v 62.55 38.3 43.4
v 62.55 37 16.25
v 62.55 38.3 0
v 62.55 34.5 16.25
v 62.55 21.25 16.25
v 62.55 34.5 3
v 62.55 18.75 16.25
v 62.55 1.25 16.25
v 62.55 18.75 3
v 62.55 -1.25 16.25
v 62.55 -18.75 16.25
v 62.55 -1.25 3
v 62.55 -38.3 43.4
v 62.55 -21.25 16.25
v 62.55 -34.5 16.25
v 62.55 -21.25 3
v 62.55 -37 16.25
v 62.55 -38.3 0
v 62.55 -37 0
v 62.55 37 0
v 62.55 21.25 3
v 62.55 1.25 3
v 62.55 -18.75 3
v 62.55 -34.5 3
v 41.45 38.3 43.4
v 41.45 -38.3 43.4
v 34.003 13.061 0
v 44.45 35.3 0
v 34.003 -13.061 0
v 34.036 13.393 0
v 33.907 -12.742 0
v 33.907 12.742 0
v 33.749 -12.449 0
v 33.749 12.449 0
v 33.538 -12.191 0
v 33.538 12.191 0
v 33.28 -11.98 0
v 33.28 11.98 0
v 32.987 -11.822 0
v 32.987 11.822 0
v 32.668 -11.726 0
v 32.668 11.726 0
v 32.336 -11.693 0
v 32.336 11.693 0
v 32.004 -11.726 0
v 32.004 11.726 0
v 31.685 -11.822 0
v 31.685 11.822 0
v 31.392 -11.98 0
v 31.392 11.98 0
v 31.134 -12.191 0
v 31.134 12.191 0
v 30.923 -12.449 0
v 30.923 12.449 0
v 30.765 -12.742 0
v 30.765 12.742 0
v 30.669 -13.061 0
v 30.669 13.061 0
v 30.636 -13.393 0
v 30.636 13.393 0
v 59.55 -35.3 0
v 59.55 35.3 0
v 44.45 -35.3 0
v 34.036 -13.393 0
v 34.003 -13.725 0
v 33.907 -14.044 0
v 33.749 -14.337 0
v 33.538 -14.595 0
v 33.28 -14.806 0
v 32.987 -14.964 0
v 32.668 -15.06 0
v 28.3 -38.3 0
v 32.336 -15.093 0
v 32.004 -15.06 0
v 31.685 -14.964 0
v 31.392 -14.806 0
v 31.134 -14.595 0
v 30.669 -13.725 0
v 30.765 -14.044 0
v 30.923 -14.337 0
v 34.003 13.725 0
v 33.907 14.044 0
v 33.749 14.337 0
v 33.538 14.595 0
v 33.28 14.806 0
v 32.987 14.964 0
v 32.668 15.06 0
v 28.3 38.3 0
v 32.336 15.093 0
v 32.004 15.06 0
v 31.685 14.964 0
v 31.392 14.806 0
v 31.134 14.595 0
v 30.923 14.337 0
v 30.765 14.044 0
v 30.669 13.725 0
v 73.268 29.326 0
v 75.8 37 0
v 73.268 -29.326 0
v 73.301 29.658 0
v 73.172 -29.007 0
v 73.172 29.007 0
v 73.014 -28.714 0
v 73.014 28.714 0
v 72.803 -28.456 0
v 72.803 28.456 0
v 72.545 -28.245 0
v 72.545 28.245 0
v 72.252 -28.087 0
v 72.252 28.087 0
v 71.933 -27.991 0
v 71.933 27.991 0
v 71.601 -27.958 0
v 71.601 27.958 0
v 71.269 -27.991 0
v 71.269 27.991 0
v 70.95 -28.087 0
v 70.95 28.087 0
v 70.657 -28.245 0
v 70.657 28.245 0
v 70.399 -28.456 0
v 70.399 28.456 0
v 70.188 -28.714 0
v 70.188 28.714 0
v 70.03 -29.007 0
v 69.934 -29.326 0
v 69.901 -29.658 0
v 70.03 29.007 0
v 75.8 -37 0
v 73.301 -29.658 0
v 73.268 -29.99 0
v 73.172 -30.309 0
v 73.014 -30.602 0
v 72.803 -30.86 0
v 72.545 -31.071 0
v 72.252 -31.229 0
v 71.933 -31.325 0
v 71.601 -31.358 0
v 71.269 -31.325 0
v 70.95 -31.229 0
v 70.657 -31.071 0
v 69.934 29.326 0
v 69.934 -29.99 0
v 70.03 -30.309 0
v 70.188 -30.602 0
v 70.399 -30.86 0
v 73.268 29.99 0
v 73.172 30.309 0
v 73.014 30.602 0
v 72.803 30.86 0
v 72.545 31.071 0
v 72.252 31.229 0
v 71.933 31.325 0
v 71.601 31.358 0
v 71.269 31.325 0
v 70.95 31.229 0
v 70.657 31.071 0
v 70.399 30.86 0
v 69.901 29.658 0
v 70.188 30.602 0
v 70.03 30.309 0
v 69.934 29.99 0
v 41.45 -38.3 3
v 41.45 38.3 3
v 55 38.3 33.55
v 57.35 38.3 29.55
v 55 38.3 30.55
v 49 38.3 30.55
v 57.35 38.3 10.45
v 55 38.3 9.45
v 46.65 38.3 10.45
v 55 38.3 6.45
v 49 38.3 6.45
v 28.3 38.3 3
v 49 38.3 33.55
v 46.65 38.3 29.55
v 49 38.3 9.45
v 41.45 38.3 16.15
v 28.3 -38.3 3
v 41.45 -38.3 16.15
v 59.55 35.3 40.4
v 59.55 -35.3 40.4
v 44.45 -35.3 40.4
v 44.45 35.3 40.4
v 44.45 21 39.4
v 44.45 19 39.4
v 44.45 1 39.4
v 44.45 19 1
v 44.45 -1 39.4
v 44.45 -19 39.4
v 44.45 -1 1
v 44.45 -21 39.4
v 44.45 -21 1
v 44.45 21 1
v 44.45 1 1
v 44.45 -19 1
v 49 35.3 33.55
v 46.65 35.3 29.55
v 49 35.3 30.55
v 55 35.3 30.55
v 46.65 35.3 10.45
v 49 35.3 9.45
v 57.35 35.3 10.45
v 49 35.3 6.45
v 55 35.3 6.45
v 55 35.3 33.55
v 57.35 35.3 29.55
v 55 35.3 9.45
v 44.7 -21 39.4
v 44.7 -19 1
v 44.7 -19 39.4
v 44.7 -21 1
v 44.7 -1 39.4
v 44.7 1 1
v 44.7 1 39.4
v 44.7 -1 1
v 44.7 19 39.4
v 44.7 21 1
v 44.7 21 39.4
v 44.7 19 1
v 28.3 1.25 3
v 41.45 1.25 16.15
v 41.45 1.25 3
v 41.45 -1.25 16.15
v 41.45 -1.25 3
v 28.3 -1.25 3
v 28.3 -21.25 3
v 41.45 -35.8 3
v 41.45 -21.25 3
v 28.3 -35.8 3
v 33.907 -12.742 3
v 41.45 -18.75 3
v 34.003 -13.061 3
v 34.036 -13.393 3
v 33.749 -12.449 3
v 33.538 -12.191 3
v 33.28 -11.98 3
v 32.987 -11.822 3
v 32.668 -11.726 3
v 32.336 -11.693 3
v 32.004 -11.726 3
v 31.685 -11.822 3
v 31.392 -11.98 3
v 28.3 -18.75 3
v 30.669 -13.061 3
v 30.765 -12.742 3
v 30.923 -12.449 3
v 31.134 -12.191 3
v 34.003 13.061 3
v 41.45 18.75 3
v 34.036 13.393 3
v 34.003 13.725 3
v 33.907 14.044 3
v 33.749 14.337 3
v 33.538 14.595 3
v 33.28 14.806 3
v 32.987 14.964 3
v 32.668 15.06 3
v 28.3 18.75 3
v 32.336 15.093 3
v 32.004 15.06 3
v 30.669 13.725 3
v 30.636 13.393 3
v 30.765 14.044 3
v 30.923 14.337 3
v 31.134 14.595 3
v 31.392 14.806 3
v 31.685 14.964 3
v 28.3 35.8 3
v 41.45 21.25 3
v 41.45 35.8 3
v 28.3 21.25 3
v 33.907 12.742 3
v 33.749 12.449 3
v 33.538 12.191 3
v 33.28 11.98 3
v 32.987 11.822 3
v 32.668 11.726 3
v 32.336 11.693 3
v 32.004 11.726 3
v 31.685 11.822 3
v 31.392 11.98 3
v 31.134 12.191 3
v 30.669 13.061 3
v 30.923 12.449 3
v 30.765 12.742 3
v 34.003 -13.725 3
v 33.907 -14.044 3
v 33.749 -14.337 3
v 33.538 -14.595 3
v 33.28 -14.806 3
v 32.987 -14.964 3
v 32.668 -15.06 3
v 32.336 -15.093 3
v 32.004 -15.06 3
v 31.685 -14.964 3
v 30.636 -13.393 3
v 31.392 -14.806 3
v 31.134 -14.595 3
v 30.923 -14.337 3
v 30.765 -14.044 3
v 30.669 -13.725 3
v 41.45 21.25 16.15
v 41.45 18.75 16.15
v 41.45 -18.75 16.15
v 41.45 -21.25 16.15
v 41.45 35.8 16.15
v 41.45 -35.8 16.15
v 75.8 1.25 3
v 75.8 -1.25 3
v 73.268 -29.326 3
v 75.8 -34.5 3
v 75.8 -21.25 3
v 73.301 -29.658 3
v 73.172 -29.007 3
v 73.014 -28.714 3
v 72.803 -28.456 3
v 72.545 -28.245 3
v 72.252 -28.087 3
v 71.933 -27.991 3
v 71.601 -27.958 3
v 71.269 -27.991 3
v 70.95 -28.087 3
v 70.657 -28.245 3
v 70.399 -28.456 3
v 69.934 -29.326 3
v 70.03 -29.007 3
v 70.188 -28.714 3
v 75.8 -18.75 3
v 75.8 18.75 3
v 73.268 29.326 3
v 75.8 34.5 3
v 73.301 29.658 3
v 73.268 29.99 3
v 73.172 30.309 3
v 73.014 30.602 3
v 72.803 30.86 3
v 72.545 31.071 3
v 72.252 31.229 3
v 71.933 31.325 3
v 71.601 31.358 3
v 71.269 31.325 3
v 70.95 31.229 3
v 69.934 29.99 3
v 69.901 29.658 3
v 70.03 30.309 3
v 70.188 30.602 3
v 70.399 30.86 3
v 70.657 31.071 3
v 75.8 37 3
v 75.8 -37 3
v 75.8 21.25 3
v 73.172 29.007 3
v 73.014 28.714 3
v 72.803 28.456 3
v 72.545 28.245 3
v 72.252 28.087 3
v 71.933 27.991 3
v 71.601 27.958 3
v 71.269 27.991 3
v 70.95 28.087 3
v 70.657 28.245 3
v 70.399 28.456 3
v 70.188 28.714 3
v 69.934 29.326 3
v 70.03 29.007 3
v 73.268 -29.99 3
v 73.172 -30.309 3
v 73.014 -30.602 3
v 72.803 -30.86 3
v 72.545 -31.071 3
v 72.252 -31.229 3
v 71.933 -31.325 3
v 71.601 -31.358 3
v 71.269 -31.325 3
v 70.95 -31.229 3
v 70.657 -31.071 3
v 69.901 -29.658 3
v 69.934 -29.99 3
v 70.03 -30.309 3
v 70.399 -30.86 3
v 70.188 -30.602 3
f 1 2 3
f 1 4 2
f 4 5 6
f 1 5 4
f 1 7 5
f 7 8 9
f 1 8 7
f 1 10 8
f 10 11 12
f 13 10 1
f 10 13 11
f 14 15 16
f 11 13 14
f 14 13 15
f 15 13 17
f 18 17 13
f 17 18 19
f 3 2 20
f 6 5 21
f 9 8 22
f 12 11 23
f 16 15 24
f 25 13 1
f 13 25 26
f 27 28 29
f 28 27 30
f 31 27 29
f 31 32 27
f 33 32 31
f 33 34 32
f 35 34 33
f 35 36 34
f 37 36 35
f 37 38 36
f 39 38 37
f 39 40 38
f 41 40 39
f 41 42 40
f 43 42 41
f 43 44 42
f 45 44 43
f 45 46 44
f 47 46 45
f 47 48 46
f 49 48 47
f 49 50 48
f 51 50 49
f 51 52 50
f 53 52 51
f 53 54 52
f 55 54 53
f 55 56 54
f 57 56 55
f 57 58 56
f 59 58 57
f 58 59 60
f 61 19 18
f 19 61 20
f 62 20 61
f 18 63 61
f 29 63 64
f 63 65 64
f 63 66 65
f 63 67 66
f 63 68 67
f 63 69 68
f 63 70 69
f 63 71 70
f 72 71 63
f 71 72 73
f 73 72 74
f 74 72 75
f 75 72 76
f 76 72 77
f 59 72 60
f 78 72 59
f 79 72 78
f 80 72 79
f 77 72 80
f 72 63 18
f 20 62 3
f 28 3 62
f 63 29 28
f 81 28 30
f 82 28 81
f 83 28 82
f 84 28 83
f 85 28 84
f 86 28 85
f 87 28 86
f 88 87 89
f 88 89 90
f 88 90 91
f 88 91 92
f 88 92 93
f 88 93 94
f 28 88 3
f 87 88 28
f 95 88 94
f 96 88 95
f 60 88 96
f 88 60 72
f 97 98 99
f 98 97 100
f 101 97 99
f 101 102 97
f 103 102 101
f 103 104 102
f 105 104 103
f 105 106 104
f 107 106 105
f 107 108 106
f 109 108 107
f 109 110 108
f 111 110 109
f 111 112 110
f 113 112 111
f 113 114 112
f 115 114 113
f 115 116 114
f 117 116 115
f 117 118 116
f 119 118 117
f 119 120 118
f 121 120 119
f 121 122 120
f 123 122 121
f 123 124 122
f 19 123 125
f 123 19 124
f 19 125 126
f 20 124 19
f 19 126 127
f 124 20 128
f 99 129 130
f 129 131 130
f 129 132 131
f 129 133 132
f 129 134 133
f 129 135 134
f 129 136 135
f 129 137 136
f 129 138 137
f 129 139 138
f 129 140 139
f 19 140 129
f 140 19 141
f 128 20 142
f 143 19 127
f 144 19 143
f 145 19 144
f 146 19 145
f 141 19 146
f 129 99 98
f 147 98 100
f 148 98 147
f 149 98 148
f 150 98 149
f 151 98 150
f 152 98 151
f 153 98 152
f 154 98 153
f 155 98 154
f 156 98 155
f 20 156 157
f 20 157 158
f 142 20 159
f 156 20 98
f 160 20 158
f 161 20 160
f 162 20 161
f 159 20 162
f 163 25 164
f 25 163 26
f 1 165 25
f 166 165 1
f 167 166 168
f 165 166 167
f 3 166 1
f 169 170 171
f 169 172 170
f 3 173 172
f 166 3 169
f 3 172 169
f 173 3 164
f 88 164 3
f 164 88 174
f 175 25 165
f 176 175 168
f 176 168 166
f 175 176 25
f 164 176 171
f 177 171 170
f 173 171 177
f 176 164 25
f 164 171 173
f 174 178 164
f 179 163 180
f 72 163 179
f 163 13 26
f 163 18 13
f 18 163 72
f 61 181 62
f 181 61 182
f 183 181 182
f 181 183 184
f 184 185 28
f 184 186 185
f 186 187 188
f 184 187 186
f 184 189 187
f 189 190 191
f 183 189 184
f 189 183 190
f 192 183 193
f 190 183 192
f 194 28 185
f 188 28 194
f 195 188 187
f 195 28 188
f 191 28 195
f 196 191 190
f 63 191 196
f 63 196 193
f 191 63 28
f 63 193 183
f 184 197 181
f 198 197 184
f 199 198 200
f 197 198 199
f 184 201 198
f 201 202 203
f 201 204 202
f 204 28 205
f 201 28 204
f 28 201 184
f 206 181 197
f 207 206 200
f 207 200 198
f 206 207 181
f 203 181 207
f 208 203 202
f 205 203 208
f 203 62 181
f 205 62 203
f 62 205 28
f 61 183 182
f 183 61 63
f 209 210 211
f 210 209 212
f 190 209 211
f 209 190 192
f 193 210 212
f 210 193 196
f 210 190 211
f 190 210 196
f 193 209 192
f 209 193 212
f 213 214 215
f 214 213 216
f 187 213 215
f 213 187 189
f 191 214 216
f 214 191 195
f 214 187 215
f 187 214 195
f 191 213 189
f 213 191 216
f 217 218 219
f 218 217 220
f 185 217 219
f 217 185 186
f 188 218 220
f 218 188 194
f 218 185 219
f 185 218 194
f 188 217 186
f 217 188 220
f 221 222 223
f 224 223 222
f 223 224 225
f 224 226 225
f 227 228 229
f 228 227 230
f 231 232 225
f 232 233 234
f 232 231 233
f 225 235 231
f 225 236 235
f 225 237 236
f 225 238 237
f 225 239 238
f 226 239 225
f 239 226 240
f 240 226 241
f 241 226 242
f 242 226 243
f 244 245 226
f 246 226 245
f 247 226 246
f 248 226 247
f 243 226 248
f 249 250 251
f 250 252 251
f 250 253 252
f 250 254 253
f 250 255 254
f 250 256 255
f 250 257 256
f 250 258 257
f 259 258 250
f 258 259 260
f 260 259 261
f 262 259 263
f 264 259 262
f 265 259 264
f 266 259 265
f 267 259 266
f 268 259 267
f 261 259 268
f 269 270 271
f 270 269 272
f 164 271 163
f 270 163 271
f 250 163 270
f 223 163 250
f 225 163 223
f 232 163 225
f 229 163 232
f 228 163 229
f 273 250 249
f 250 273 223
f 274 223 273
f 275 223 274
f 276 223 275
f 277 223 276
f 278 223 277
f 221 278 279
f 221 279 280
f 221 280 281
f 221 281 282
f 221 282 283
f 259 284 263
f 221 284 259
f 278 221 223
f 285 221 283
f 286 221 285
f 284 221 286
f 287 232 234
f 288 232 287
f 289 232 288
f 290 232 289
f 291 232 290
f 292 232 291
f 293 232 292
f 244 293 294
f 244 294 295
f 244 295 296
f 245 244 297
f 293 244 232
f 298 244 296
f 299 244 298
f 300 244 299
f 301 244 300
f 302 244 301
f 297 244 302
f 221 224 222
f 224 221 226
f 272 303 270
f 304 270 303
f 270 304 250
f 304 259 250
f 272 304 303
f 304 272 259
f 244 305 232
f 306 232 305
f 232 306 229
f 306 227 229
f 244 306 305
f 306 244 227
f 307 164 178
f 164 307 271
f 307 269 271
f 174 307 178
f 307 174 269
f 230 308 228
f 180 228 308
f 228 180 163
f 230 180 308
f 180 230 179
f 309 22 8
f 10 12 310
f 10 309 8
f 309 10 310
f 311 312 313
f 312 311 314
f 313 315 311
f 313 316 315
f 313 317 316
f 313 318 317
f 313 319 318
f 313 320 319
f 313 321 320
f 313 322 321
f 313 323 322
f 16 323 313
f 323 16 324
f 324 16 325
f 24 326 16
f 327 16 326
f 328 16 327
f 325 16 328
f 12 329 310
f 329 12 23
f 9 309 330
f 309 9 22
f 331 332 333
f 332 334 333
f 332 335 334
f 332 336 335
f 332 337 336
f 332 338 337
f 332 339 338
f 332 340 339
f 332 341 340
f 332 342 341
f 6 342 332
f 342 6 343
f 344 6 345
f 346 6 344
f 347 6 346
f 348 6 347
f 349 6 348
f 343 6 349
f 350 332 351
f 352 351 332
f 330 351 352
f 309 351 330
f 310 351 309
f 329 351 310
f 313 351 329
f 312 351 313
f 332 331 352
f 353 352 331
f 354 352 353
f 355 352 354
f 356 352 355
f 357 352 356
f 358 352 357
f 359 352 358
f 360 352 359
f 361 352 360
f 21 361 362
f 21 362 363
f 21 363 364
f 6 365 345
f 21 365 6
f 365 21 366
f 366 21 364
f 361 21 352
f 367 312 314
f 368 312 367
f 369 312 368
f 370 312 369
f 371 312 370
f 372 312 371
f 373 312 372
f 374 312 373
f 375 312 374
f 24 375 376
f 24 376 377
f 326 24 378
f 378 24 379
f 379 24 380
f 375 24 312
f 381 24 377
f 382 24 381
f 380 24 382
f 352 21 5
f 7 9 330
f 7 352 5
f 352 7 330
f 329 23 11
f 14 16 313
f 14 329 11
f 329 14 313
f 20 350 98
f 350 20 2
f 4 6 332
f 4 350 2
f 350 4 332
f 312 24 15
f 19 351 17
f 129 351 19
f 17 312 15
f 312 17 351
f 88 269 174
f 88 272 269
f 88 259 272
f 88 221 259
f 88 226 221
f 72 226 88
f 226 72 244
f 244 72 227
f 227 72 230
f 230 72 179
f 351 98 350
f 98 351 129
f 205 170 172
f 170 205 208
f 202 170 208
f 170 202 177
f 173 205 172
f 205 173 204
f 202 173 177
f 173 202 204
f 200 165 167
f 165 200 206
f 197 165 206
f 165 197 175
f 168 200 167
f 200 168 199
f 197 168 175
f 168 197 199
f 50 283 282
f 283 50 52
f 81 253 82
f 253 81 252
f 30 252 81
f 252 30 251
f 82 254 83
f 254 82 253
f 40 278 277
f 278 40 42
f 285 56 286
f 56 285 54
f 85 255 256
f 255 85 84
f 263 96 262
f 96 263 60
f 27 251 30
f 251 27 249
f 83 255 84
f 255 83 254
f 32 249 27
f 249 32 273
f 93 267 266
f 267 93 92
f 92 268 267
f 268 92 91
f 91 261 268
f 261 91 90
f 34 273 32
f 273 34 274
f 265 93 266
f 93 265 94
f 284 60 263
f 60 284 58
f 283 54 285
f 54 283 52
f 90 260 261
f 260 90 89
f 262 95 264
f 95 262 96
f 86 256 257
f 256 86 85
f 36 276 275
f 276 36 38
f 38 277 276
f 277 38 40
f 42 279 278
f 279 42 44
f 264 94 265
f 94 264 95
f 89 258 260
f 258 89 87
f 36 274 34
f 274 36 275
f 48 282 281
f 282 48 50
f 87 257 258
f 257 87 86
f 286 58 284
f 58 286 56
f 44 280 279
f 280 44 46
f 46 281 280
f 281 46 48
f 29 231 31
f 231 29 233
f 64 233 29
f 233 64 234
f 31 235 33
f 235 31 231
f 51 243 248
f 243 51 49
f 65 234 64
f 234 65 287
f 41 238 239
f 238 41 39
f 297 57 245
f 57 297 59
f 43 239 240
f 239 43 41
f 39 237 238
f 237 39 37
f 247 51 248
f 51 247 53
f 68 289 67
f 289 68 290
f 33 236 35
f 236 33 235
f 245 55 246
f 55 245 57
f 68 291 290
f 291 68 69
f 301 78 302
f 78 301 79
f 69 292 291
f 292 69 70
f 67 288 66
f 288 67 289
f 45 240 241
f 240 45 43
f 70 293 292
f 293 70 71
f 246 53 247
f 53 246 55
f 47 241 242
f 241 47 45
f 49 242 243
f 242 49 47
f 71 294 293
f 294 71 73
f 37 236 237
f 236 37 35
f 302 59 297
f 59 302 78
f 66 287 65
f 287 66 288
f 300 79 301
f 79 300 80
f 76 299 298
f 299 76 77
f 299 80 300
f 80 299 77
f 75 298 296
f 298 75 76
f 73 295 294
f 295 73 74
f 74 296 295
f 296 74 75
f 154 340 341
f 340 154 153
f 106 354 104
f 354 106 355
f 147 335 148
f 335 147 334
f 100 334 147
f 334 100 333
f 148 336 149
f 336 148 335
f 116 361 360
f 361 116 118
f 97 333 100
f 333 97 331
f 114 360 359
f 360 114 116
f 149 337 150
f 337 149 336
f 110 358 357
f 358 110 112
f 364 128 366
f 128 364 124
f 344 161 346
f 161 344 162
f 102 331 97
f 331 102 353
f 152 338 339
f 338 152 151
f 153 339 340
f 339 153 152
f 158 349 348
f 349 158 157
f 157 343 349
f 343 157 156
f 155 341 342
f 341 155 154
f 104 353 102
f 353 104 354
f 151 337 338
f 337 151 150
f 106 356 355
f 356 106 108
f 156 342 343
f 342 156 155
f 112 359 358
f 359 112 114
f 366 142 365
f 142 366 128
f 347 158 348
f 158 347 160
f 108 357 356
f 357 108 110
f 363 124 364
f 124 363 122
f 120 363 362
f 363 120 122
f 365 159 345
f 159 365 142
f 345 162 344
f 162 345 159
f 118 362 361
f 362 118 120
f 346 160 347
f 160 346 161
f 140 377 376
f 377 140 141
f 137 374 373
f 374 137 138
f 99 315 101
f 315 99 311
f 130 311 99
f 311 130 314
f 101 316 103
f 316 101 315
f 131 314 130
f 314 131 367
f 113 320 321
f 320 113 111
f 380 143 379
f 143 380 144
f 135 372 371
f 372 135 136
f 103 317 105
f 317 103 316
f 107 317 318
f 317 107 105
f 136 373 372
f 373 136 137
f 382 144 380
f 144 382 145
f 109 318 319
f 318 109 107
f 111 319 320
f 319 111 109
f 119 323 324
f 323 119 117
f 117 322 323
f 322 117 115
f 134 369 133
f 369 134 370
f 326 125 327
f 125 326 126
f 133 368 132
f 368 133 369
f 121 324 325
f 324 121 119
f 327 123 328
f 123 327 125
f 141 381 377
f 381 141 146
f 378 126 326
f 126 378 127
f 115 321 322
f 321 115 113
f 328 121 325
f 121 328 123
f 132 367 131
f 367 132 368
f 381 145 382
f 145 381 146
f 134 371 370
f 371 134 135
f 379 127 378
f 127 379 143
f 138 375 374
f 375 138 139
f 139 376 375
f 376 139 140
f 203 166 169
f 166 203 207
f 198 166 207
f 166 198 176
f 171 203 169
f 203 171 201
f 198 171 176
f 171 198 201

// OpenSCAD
// wifi_box — USB WiFi 网卡倒扣盒 (与 build_box.py 同参, 2026-07-09 第三版定稿)。
// 盘坐标系, Z0 = 盘顶面 = 打印姿态 (开口朝下, 零支撑, 顶板 15.1 桥接)。
// 模块侧立整块 14.5×40×70 (天线反折在内), 以 14.5×70 面坐盘, 插头朝 +Y (米联派 J6 方向)。
// 4 耳脚借盘环孔 M3×14 (耳3+盘5+rim_ring3.5, 环底垫片+螺母)。
// 装配: 盒倒置 → 模块放入 → 母头从窗外插合 → 翻正扣盘 → 4 螺丝 → 扎带勒母头壳。

BLK_T = 14.5;  BLK_L = 70;  BLK_H = 40;      // 模块整块 厚×长×高
XC = 52;  CLR = 0.3;  WALL = 3;              // 中线 / 间隙 / 壁厚 (用户指定 3)
IX0 = XC-BLK_T/2-CLR;  IX1 = XC+BLK_T/2+CLR; // 内腔 X 44.45..59.55
IY = BLK_L/2+CLR;                            // 内腔 Y ±35.3
IZ1 = BLK_H+0.4;                             // 内腔顶 40.4
OX0 = IX0-WALL;  OX1 = IX1+WALL;  OY = IY+WALL;  OZ1 = IZ1+WALL;
ZC = BLK_H/2;                                // 插头/母头轴线高 20
WIN_W = 10.7;  WIN_H = 19.1;                 // 母头出口窗 (母头壳 10.3×18.7 +0.4)
TIE_W = 6;  TIE_H = 3;                       // 扎带槽 (窗上下各一)
DISC_M3 = [[32.336,13.393],[32.336,-13.393],[71.601,29.658],[71.601,-29.658]];
FL_T = 3;  WFL_X0 = 28.3;  EFL_X1 = 75.8;  EFL_HY = 37;   // 整条翼板 (2 耳合一)
GUS_T = 2.5;  WGUS_YS = [0,20,-20,37.05,-37.05];  EGUS_YS = [0,20,-20,35.75,-35.75];
RIB_YS = [-20,0,20];                         // 西内壁摩擦筋 0.25×2

module bbox(x0,x1,y0,y1,z0,z1){ translate([x0,y0,z0]) cube([x1-x0,y1-y0,z1-z0]); }
module gusset(x_out,x_wall,yc){              // 三角加强筋 45° (免支撑)
  arm = abs(x_wall-x_out);
  translate([0,yc+GUS_T/2,0]) rotate([90,0,0]) linear_extrude(GUS_T)
    polygon(x_out<x_wall ? [[x_out,FL_T],[x_wall,FL_T],[x_wall,FL_T+arm]]
                         : [[x_wall,FL_T+arm],[x_wall,FL_T],[x_out,FL_T]]);
}

difference(){
  union(){
    difference(){
      bbox(OX0,OX1,-OY,OY,0,OZ1);                       // 外壳
      bbox(IX0,IX1,-IY,IY,-1,IZ1);                      // 内腔 (开口朝下)
    }
    for(yc=RIB_YS) bbox(IX0,IX0+0.25,yc-1,yc+1,1,IZ1-1);   // 摩擦筋
    bbox(WFL_X0,OX0,-OY,OY,0,FL_T);                     // 西翼板 (整条全长)
    bbox(OX1,EFL_X1,-EFL_HY,EFL_HY,0,FL_T);             // 东翼板 (整条 ±37)
    for(yc=WGUS_YS) gusset(WFL_X0,OX0,yc);              // 西加强筋 ×5
    for(yc=EGUS_YS) gusset(EFL_X1,OX1,yc);              // 东加强筋 ×5
  }
  bbox(XC-WIN_W/2,XC+WIN_W/2,IY-1,OY+1,ZC-WIN_H/2,ZC+WIN_H/2);   // 母头出口窗
  for(z0=[ZC-WIN_H/2-1-TIE_H, ZC+WIN_H/2+1])                     // 扎带槽 ×2
    bbox(XC-TIE_W/2,XC+TIE_W/2,IY-1,OY+1,z0,z0+TIE_H);
  for(h=DISC_M3) translate([h[0],h[1],-1]) cylinder(h=FL_T+2, d=3.4, $fn=32);  // 翼板孔
}
